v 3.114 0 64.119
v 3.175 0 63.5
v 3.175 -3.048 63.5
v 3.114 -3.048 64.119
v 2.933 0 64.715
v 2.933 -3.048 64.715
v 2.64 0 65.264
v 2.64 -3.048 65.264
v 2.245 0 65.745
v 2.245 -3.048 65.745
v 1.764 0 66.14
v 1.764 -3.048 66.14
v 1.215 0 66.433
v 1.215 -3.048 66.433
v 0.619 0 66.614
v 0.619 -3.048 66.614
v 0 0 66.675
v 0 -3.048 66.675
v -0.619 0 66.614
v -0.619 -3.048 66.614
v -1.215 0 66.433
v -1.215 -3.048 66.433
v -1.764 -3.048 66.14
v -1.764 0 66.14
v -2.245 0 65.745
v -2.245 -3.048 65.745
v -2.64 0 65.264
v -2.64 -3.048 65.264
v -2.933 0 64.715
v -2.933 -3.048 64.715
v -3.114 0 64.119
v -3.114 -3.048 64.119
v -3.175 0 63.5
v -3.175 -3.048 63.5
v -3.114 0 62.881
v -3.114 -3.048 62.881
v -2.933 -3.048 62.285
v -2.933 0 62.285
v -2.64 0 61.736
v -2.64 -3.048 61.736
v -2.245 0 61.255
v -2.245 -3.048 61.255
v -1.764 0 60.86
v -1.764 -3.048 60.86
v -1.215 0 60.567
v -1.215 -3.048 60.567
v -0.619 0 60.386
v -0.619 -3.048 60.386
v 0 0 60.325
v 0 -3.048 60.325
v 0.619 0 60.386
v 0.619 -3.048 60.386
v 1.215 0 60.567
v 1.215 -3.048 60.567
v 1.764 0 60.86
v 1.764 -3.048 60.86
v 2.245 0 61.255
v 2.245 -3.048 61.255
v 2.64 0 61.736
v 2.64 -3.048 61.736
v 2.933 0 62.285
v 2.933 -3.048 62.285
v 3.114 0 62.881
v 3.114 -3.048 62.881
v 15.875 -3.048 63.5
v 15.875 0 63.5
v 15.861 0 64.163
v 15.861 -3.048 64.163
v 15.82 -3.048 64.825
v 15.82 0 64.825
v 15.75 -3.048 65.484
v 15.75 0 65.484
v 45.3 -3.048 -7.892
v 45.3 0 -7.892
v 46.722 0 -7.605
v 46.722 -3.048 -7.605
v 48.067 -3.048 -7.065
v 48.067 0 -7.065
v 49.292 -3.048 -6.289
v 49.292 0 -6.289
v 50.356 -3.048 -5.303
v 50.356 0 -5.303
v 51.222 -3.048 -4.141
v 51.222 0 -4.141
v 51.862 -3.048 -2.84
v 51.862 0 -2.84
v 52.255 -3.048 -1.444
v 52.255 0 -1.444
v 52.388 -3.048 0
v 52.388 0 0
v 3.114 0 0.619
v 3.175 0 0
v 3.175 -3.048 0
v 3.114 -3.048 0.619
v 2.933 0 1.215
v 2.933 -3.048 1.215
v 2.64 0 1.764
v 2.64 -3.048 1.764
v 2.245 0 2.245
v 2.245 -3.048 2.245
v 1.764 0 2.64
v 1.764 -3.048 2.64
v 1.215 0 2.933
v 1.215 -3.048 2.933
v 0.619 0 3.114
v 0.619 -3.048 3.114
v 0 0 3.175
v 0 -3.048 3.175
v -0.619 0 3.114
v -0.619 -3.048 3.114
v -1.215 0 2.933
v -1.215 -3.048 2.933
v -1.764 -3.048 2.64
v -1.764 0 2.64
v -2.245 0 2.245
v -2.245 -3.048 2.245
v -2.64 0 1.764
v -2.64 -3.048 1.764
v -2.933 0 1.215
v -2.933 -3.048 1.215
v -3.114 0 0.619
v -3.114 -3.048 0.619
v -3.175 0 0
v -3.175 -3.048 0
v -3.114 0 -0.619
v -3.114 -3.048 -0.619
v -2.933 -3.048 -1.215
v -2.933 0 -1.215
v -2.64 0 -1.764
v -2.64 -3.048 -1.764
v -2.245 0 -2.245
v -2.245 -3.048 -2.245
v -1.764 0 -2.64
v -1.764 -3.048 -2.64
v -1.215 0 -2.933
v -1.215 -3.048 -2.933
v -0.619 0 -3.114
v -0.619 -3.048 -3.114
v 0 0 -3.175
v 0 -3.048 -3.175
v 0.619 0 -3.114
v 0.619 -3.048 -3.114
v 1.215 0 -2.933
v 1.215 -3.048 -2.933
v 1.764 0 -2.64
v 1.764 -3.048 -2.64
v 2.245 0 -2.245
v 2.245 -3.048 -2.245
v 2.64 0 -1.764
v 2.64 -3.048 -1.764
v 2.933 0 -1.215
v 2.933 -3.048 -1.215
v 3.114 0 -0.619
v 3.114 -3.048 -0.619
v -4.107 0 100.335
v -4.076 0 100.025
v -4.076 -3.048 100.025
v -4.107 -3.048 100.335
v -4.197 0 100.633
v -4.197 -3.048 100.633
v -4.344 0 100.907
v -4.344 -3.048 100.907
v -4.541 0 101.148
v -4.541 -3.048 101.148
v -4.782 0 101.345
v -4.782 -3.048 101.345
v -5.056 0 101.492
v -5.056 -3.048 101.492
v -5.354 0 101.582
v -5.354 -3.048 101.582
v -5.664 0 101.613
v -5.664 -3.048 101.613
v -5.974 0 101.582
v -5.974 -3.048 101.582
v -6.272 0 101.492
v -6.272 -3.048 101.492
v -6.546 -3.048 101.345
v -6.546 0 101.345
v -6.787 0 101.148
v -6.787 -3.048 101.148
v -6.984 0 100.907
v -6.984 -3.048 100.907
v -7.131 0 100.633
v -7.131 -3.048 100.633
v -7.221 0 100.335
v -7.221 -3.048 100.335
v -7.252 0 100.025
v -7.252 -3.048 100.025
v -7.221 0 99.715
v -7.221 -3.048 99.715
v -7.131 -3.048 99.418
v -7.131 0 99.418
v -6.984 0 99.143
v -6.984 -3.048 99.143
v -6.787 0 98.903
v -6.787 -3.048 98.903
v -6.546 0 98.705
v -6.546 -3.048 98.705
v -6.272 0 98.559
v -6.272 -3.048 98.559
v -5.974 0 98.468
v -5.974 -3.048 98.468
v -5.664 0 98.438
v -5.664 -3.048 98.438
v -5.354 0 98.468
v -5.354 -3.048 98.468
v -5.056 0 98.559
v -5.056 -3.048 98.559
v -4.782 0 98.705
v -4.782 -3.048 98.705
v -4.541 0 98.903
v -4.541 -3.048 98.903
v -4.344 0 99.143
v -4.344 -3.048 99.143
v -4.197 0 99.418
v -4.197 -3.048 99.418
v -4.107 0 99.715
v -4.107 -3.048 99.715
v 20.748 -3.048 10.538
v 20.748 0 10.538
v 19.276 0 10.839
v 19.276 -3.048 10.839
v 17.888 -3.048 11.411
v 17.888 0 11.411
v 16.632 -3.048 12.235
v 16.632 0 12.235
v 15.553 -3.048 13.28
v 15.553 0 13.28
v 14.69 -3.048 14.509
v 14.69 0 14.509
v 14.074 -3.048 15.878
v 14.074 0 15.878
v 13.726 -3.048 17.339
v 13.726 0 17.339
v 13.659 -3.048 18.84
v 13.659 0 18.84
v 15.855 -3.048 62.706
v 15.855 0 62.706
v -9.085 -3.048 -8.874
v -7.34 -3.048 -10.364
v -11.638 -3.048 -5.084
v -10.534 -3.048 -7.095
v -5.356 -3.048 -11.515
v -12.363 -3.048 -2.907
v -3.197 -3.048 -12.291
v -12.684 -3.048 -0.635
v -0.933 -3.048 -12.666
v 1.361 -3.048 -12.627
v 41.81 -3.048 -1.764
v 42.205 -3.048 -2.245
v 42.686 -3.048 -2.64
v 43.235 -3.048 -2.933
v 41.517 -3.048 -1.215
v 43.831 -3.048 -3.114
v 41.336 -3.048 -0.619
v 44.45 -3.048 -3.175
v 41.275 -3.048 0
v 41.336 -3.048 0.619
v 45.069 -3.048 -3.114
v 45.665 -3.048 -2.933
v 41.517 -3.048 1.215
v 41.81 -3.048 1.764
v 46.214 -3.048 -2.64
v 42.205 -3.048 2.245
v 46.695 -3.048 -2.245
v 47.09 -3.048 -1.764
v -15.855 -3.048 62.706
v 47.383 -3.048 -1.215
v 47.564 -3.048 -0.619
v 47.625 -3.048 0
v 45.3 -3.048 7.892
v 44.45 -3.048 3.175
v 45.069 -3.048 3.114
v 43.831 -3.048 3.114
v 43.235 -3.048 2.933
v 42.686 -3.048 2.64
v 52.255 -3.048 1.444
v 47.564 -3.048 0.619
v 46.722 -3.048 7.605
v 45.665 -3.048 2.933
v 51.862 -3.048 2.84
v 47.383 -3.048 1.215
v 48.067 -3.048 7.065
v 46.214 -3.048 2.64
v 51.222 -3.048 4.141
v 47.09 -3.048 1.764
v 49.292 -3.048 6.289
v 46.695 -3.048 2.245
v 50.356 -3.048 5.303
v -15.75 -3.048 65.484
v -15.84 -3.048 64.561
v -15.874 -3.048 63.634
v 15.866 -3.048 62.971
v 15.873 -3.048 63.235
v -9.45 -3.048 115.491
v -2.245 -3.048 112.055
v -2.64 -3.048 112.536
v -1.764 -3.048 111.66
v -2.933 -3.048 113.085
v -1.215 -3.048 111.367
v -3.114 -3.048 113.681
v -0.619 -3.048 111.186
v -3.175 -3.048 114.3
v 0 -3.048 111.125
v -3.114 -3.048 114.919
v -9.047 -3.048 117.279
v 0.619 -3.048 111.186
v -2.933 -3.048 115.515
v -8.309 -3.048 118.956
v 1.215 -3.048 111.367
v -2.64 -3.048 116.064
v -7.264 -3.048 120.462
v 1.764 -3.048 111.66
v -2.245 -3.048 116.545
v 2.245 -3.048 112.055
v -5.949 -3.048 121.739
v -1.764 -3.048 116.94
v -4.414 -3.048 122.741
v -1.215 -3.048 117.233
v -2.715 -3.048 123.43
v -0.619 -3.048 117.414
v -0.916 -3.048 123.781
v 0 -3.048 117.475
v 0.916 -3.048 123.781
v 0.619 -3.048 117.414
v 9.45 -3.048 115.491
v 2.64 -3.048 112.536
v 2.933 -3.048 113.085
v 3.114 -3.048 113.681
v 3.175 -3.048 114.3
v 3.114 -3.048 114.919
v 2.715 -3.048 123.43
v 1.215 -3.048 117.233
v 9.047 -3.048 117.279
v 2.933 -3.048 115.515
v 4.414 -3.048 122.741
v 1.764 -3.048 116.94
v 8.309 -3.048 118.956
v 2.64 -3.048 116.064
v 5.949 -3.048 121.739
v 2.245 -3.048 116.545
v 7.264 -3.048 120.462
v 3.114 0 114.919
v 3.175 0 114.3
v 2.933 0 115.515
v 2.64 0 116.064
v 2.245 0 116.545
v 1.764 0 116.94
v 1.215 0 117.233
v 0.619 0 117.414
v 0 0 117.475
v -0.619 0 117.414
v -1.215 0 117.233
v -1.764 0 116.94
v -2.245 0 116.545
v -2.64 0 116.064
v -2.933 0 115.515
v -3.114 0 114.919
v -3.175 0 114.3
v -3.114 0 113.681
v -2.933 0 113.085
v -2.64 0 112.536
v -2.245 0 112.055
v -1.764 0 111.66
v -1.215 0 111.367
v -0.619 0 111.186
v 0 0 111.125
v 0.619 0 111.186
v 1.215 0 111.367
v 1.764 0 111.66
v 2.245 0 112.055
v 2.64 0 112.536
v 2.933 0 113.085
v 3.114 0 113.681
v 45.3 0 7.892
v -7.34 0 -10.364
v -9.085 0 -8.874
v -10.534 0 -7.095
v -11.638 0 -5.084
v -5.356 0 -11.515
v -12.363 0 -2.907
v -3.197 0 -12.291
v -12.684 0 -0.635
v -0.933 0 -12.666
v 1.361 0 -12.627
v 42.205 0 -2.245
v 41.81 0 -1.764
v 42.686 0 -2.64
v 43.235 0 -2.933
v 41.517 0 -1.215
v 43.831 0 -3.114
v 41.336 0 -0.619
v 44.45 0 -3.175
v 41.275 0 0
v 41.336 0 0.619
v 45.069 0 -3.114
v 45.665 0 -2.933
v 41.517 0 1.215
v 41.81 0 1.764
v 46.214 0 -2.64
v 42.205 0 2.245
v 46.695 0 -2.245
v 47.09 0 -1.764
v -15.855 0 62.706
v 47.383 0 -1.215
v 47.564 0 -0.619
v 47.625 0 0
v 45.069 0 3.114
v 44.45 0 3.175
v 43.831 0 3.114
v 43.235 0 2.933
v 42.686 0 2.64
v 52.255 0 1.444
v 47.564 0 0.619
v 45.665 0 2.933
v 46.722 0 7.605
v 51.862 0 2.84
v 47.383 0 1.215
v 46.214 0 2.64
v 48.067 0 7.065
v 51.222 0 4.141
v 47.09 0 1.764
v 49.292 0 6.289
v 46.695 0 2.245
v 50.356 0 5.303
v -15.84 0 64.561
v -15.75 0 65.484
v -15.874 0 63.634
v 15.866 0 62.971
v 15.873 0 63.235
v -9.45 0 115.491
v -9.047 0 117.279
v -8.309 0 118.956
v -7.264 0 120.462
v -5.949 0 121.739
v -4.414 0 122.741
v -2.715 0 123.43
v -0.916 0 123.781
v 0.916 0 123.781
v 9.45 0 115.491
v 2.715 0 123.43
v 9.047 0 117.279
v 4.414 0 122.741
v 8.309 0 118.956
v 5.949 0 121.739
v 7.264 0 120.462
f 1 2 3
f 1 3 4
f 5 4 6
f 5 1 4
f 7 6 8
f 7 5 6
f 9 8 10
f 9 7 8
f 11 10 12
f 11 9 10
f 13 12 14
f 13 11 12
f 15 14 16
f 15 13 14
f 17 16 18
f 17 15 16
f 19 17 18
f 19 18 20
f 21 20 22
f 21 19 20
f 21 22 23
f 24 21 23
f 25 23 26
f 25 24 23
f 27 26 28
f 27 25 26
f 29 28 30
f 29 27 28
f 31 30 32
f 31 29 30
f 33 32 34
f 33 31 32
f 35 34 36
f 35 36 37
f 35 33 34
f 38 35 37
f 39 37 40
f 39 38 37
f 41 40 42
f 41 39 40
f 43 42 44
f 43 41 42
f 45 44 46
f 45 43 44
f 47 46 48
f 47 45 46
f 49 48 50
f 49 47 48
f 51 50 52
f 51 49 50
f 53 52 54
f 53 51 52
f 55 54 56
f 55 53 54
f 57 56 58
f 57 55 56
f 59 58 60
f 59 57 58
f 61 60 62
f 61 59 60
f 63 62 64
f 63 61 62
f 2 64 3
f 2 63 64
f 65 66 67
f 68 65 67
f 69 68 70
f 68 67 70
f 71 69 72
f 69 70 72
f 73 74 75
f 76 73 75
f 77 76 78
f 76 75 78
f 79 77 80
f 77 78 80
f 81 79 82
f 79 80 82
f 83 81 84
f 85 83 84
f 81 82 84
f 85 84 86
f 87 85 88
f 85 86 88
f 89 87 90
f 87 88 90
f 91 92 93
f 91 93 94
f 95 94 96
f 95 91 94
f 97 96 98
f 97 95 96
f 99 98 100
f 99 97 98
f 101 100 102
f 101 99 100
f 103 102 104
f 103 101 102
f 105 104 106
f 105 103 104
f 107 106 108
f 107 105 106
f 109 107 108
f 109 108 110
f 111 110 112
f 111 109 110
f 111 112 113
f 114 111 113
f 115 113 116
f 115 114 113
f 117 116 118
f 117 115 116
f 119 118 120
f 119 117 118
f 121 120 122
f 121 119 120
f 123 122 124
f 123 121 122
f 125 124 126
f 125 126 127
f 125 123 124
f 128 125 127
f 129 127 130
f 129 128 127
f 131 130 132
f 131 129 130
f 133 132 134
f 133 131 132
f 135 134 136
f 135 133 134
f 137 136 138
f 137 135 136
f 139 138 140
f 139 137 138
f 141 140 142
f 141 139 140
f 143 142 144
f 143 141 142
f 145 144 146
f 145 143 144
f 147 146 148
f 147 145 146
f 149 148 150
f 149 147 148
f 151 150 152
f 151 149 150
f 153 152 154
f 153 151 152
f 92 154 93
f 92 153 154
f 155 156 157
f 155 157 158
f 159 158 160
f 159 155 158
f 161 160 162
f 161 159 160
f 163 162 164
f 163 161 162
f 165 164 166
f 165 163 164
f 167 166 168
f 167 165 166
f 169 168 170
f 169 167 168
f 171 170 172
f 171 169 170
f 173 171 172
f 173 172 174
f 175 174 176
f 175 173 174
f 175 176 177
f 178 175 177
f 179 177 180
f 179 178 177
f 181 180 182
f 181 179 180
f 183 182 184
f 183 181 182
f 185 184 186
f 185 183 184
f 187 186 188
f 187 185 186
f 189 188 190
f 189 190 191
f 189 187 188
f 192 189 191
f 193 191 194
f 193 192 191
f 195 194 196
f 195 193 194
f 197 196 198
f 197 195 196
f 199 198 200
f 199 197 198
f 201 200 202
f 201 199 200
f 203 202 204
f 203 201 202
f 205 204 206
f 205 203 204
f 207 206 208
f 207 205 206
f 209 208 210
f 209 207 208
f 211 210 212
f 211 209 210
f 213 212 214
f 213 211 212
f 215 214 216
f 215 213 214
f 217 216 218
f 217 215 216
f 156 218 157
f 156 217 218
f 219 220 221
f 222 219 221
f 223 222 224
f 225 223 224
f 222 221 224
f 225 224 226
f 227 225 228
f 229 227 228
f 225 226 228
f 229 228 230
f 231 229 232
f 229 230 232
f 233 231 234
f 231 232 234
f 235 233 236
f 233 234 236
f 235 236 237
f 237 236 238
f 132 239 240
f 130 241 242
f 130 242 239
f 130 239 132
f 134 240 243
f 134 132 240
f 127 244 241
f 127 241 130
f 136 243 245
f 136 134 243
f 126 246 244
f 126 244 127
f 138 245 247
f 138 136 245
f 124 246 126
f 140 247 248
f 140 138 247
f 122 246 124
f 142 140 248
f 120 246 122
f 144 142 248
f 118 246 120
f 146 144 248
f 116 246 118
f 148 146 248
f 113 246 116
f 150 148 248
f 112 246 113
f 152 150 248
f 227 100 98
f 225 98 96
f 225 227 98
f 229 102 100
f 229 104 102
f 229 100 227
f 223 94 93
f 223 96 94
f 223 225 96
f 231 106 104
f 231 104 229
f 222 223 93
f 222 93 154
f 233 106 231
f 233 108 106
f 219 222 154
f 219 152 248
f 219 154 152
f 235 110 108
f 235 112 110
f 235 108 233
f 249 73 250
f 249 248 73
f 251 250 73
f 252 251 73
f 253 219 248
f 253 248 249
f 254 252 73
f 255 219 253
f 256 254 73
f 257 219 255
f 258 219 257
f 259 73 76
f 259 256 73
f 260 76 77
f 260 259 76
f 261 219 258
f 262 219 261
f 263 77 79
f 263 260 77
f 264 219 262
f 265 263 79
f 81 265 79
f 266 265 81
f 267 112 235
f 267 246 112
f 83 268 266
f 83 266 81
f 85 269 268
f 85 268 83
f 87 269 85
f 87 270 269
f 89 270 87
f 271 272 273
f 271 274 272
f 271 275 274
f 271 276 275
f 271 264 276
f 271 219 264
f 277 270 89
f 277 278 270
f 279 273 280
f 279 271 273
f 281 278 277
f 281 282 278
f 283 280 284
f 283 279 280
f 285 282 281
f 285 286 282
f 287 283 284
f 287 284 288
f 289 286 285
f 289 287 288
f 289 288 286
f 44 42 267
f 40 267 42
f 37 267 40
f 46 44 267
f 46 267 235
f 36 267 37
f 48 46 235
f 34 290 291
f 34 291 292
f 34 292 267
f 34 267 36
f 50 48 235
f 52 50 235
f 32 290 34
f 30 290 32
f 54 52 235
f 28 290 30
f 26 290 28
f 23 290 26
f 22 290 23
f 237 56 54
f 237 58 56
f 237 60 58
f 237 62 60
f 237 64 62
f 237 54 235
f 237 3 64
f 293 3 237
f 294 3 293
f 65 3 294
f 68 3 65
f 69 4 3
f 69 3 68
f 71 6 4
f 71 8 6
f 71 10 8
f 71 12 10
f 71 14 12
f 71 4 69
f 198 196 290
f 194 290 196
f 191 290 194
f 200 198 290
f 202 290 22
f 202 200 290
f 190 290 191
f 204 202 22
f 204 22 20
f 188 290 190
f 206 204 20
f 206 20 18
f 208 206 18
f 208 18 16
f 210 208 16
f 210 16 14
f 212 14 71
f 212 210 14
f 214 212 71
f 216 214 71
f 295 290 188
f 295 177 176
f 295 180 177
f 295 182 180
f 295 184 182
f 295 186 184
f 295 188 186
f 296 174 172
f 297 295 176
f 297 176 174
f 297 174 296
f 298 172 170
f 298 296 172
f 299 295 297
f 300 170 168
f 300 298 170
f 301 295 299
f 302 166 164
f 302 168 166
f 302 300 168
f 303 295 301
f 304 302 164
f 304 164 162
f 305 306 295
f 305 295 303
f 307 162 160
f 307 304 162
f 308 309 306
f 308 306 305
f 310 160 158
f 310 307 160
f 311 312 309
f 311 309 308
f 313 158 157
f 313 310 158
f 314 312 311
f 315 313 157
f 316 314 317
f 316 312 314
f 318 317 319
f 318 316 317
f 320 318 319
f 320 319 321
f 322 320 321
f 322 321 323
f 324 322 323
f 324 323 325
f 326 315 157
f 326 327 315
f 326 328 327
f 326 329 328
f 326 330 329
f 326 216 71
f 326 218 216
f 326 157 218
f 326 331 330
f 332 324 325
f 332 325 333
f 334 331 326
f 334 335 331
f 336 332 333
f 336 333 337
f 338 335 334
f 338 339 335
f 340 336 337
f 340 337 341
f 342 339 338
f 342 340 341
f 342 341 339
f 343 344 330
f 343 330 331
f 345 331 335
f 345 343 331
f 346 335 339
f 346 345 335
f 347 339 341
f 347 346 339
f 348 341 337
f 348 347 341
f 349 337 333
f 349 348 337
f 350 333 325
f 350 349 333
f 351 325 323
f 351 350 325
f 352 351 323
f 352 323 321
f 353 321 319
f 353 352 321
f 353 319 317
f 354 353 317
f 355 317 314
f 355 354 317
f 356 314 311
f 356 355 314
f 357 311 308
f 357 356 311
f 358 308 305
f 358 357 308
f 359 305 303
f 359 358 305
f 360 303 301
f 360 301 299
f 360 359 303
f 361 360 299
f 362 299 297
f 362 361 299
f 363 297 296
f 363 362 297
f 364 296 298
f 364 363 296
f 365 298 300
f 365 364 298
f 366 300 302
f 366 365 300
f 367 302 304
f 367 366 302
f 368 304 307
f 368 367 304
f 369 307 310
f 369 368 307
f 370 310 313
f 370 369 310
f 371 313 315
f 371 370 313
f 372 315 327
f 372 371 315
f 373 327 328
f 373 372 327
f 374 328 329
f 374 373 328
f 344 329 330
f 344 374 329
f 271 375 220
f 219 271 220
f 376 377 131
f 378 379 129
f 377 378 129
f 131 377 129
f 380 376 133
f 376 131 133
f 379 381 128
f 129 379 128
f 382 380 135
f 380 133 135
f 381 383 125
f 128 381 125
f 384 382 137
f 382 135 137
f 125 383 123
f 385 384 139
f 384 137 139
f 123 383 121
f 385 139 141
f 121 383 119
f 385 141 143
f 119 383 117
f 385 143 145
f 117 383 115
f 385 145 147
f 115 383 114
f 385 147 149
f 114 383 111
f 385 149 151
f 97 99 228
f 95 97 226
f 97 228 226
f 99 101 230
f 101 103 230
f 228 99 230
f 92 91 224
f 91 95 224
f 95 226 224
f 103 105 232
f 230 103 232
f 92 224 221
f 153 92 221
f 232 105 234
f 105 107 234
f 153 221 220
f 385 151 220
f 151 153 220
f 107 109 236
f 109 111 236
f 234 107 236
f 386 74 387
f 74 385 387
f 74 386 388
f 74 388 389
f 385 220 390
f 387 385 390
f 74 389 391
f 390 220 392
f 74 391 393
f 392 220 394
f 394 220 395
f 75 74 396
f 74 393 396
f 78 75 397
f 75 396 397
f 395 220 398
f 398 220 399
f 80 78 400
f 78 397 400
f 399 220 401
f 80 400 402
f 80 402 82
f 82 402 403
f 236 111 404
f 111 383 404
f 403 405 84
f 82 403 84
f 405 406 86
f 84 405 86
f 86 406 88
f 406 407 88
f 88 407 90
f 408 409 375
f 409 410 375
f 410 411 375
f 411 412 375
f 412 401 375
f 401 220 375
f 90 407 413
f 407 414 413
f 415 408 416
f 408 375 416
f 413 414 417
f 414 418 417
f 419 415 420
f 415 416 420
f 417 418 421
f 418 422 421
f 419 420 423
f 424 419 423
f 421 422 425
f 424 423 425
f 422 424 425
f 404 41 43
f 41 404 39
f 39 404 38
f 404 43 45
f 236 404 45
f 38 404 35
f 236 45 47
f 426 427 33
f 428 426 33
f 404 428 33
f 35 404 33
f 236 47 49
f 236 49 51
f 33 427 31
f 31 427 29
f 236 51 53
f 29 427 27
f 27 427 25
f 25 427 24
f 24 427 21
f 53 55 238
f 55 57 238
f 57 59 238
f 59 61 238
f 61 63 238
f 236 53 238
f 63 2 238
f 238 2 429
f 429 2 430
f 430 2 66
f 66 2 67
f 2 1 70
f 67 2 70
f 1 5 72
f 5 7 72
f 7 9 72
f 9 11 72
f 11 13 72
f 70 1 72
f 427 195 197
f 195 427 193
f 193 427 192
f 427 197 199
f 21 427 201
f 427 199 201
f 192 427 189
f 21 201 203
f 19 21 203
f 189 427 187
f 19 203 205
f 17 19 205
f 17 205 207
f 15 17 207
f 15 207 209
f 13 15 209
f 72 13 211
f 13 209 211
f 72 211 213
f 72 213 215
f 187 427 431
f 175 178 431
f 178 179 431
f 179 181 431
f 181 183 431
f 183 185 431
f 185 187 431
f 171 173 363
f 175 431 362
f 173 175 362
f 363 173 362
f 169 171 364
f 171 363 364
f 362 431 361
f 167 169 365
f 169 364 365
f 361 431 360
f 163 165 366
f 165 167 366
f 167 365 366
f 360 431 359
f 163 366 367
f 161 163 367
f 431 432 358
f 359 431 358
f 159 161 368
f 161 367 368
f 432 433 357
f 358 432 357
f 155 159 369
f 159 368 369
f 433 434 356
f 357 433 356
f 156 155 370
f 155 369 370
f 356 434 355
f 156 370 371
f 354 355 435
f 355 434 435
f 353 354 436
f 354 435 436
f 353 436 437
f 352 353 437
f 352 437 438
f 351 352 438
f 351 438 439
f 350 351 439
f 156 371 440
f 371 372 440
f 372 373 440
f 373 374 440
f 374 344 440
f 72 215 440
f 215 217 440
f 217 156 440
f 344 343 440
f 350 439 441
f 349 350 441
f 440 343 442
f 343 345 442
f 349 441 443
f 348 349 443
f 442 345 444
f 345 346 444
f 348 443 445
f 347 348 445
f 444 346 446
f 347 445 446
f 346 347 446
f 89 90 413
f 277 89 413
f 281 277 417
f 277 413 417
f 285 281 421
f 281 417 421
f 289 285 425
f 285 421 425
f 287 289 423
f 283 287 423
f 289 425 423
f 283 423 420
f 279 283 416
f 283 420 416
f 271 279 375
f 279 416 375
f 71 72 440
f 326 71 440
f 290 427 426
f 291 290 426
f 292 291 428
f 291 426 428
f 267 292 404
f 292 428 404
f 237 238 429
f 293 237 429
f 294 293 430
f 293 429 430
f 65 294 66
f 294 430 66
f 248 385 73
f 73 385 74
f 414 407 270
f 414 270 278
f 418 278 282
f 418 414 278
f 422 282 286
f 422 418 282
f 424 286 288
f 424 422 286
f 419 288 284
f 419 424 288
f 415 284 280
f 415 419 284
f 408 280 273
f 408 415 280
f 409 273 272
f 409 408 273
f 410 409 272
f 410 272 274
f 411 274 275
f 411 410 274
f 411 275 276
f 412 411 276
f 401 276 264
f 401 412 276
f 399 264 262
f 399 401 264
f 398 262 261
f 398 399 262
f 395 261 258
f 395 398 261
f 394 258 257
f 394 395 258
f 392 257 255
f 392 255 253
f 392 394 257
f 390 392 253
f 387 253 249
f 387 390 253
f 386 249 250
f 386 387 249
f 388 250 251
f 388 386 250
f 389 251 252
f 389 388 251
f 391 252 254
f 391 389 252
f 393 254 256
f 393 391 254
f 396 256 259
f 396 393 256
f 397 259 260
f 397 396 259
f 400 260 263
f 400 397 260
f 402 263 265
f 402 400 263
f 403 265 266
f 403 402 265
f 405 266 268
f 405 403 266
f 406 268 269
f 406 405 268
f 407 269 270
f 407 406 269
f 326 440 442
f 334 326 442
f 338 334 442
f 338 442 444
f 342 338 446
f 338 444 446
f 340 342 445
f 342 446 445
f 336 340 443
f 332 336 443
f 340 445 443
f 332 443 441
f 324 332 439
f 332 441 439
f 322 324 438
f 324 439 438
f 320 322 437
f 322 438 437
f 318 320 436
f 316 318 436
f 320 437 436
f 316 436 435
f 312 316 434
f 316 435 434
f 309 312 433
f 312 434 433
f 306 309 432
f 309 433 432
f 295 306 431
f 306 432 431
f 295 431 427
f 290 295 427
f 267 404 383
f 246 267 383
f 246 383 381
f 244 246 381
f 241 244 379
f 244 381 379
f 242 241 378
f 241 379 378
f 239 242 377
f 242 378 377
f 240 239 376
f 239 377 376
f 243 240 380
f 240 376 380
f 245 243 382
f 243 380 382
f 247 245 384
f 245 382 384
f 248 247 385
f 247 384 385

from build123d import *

# Parameters (mm, degrees)
F0_R     = 1.5875
F0_R_2   = 3.175
F1_DEPTH = 3.048


with BuildPart() as f1:
    # F0 (on Front) → F1 (new body)
    with BuildSketch(Plane.XZ):
        with BuildLine():
            Line((-9.450293, 115.490625), (-15.750488, 65.484375))
            ThreePointArc((-15.750488, 65.484375), (0, 79.375), (15.750488, 65.484375))
            Line((15.750488, 65.484375), (9.450293, 115.490625))
            ThreePointArc((9.450293, 115.490625), (9.506305, 114.896483), (9.525, 114.3))
            ThreePointArc((9.525, 114.3), (-0.596483, 104.793695), (-9.450293, 115.490625))
        make_face()
        with Locations((-5.664, 100.0252)):
            Circle(F0_R, mode=Mode.SUBTRACT)
        with BuildLine():
            ThreePointArc((-15.750488, 65.484375), (-15.863748, 64.097608), (-15.855144, 62.70625))
            ThreePointArc((-15.855144, 62.70625), (0, 47.625), (15.855144, 62.70625))
            ThreePointArc((15.855144, 62.70625), (15.870035, 63.103001), (15.875, 63.5))
            ThreePointArc((15.875, 63.5), (15.843841, 64.494139), (15.750488, 65.484375))
            ThreePointArc((15.750488, 65.484375), (0, 79.375), (-15.750488, 65.484375))
        make_face()
        with Locations((0, 63.5)):
            Circle(F0_R_2, mode=Mode.SUBTRACT)
        with BuildLine():
            ThreePointArc((-12.684115, -0.635), (-0.317599, 12.696028), (12.7, 0))
            ThreePointArc((12.7, 0), (9.449102, -8.485544), (1.360714, -12.626894))
            Line((1.360714, -12.626894), (45.300446, -7.891809))
            ThreePointArc((45.300446, -7.891809), (36.5125, 0), (45.300446, 7.891809))
            Line((45.300446, 7.891809), (20.747516, 10.537711))
            ThreePointArc((20.747516, 10.537711), (15.553195, 13.279782), (13.659067, 18.839656))
            Line((13.659067, 18.839656), (15.855144, 62.70625))
            ThreePointArc((15.855144, 62.70625), (0, 47.625), (-15.855144, 62.70625))
            Line((-15.855144, 62.70625), (-12.684115, -0.635))
        make_face()
        with BuildLine():
            ThreePointArc((1.360714, -12.626894), (9.449102, -8.485544), (12.7, 0))
            ThreePointArc((12.7, 0), (-0.317599, 12.696028), (-12.684115, -0.635))
            ThreePointArc((-12.684115, -0.635), (-8.246589, -9.658352), (1.360714, -12.626894))
        make_face()
        Circle(F0_R_2, mode=Mode.SUBTRACT)
        with BuildLine():
            ThreePointArc((45.300446, 7.891809), (36.5125, 0), (45.300446, -7.891809))
            ThreePointArc((45.300446, -7.891809), (50.355689, -5.303465), (52.3875, 0))
            ThreePointArc((52.3875, 0), (50.355689, 5.303465), (45.300446, 7.891809))
        make_face()
        with Locations((44.45, 0)):
            Circle(F0_R_2, mode=Mode.SUBTRACT)
        with BuildLine():
            ThreePointArc((9.450293, 115.490625), (0, 123.825), (-9.450293, 115.490625))
            ThreePointArc((-9.450293, 115.490625), (-0.596483, 104.793695), (9.525, 114.3))
            ThreePointArc((9.525, 114.3), (9.506305, 114.896483), (9.450293, 115.490625))
        make_face()
        with Locations((0, 114.3)):
            Circle(F0_R_2, mode=Mode.SUBTRACT)
    extrude(amount=F1_DEPTH)


solid = f1.part
